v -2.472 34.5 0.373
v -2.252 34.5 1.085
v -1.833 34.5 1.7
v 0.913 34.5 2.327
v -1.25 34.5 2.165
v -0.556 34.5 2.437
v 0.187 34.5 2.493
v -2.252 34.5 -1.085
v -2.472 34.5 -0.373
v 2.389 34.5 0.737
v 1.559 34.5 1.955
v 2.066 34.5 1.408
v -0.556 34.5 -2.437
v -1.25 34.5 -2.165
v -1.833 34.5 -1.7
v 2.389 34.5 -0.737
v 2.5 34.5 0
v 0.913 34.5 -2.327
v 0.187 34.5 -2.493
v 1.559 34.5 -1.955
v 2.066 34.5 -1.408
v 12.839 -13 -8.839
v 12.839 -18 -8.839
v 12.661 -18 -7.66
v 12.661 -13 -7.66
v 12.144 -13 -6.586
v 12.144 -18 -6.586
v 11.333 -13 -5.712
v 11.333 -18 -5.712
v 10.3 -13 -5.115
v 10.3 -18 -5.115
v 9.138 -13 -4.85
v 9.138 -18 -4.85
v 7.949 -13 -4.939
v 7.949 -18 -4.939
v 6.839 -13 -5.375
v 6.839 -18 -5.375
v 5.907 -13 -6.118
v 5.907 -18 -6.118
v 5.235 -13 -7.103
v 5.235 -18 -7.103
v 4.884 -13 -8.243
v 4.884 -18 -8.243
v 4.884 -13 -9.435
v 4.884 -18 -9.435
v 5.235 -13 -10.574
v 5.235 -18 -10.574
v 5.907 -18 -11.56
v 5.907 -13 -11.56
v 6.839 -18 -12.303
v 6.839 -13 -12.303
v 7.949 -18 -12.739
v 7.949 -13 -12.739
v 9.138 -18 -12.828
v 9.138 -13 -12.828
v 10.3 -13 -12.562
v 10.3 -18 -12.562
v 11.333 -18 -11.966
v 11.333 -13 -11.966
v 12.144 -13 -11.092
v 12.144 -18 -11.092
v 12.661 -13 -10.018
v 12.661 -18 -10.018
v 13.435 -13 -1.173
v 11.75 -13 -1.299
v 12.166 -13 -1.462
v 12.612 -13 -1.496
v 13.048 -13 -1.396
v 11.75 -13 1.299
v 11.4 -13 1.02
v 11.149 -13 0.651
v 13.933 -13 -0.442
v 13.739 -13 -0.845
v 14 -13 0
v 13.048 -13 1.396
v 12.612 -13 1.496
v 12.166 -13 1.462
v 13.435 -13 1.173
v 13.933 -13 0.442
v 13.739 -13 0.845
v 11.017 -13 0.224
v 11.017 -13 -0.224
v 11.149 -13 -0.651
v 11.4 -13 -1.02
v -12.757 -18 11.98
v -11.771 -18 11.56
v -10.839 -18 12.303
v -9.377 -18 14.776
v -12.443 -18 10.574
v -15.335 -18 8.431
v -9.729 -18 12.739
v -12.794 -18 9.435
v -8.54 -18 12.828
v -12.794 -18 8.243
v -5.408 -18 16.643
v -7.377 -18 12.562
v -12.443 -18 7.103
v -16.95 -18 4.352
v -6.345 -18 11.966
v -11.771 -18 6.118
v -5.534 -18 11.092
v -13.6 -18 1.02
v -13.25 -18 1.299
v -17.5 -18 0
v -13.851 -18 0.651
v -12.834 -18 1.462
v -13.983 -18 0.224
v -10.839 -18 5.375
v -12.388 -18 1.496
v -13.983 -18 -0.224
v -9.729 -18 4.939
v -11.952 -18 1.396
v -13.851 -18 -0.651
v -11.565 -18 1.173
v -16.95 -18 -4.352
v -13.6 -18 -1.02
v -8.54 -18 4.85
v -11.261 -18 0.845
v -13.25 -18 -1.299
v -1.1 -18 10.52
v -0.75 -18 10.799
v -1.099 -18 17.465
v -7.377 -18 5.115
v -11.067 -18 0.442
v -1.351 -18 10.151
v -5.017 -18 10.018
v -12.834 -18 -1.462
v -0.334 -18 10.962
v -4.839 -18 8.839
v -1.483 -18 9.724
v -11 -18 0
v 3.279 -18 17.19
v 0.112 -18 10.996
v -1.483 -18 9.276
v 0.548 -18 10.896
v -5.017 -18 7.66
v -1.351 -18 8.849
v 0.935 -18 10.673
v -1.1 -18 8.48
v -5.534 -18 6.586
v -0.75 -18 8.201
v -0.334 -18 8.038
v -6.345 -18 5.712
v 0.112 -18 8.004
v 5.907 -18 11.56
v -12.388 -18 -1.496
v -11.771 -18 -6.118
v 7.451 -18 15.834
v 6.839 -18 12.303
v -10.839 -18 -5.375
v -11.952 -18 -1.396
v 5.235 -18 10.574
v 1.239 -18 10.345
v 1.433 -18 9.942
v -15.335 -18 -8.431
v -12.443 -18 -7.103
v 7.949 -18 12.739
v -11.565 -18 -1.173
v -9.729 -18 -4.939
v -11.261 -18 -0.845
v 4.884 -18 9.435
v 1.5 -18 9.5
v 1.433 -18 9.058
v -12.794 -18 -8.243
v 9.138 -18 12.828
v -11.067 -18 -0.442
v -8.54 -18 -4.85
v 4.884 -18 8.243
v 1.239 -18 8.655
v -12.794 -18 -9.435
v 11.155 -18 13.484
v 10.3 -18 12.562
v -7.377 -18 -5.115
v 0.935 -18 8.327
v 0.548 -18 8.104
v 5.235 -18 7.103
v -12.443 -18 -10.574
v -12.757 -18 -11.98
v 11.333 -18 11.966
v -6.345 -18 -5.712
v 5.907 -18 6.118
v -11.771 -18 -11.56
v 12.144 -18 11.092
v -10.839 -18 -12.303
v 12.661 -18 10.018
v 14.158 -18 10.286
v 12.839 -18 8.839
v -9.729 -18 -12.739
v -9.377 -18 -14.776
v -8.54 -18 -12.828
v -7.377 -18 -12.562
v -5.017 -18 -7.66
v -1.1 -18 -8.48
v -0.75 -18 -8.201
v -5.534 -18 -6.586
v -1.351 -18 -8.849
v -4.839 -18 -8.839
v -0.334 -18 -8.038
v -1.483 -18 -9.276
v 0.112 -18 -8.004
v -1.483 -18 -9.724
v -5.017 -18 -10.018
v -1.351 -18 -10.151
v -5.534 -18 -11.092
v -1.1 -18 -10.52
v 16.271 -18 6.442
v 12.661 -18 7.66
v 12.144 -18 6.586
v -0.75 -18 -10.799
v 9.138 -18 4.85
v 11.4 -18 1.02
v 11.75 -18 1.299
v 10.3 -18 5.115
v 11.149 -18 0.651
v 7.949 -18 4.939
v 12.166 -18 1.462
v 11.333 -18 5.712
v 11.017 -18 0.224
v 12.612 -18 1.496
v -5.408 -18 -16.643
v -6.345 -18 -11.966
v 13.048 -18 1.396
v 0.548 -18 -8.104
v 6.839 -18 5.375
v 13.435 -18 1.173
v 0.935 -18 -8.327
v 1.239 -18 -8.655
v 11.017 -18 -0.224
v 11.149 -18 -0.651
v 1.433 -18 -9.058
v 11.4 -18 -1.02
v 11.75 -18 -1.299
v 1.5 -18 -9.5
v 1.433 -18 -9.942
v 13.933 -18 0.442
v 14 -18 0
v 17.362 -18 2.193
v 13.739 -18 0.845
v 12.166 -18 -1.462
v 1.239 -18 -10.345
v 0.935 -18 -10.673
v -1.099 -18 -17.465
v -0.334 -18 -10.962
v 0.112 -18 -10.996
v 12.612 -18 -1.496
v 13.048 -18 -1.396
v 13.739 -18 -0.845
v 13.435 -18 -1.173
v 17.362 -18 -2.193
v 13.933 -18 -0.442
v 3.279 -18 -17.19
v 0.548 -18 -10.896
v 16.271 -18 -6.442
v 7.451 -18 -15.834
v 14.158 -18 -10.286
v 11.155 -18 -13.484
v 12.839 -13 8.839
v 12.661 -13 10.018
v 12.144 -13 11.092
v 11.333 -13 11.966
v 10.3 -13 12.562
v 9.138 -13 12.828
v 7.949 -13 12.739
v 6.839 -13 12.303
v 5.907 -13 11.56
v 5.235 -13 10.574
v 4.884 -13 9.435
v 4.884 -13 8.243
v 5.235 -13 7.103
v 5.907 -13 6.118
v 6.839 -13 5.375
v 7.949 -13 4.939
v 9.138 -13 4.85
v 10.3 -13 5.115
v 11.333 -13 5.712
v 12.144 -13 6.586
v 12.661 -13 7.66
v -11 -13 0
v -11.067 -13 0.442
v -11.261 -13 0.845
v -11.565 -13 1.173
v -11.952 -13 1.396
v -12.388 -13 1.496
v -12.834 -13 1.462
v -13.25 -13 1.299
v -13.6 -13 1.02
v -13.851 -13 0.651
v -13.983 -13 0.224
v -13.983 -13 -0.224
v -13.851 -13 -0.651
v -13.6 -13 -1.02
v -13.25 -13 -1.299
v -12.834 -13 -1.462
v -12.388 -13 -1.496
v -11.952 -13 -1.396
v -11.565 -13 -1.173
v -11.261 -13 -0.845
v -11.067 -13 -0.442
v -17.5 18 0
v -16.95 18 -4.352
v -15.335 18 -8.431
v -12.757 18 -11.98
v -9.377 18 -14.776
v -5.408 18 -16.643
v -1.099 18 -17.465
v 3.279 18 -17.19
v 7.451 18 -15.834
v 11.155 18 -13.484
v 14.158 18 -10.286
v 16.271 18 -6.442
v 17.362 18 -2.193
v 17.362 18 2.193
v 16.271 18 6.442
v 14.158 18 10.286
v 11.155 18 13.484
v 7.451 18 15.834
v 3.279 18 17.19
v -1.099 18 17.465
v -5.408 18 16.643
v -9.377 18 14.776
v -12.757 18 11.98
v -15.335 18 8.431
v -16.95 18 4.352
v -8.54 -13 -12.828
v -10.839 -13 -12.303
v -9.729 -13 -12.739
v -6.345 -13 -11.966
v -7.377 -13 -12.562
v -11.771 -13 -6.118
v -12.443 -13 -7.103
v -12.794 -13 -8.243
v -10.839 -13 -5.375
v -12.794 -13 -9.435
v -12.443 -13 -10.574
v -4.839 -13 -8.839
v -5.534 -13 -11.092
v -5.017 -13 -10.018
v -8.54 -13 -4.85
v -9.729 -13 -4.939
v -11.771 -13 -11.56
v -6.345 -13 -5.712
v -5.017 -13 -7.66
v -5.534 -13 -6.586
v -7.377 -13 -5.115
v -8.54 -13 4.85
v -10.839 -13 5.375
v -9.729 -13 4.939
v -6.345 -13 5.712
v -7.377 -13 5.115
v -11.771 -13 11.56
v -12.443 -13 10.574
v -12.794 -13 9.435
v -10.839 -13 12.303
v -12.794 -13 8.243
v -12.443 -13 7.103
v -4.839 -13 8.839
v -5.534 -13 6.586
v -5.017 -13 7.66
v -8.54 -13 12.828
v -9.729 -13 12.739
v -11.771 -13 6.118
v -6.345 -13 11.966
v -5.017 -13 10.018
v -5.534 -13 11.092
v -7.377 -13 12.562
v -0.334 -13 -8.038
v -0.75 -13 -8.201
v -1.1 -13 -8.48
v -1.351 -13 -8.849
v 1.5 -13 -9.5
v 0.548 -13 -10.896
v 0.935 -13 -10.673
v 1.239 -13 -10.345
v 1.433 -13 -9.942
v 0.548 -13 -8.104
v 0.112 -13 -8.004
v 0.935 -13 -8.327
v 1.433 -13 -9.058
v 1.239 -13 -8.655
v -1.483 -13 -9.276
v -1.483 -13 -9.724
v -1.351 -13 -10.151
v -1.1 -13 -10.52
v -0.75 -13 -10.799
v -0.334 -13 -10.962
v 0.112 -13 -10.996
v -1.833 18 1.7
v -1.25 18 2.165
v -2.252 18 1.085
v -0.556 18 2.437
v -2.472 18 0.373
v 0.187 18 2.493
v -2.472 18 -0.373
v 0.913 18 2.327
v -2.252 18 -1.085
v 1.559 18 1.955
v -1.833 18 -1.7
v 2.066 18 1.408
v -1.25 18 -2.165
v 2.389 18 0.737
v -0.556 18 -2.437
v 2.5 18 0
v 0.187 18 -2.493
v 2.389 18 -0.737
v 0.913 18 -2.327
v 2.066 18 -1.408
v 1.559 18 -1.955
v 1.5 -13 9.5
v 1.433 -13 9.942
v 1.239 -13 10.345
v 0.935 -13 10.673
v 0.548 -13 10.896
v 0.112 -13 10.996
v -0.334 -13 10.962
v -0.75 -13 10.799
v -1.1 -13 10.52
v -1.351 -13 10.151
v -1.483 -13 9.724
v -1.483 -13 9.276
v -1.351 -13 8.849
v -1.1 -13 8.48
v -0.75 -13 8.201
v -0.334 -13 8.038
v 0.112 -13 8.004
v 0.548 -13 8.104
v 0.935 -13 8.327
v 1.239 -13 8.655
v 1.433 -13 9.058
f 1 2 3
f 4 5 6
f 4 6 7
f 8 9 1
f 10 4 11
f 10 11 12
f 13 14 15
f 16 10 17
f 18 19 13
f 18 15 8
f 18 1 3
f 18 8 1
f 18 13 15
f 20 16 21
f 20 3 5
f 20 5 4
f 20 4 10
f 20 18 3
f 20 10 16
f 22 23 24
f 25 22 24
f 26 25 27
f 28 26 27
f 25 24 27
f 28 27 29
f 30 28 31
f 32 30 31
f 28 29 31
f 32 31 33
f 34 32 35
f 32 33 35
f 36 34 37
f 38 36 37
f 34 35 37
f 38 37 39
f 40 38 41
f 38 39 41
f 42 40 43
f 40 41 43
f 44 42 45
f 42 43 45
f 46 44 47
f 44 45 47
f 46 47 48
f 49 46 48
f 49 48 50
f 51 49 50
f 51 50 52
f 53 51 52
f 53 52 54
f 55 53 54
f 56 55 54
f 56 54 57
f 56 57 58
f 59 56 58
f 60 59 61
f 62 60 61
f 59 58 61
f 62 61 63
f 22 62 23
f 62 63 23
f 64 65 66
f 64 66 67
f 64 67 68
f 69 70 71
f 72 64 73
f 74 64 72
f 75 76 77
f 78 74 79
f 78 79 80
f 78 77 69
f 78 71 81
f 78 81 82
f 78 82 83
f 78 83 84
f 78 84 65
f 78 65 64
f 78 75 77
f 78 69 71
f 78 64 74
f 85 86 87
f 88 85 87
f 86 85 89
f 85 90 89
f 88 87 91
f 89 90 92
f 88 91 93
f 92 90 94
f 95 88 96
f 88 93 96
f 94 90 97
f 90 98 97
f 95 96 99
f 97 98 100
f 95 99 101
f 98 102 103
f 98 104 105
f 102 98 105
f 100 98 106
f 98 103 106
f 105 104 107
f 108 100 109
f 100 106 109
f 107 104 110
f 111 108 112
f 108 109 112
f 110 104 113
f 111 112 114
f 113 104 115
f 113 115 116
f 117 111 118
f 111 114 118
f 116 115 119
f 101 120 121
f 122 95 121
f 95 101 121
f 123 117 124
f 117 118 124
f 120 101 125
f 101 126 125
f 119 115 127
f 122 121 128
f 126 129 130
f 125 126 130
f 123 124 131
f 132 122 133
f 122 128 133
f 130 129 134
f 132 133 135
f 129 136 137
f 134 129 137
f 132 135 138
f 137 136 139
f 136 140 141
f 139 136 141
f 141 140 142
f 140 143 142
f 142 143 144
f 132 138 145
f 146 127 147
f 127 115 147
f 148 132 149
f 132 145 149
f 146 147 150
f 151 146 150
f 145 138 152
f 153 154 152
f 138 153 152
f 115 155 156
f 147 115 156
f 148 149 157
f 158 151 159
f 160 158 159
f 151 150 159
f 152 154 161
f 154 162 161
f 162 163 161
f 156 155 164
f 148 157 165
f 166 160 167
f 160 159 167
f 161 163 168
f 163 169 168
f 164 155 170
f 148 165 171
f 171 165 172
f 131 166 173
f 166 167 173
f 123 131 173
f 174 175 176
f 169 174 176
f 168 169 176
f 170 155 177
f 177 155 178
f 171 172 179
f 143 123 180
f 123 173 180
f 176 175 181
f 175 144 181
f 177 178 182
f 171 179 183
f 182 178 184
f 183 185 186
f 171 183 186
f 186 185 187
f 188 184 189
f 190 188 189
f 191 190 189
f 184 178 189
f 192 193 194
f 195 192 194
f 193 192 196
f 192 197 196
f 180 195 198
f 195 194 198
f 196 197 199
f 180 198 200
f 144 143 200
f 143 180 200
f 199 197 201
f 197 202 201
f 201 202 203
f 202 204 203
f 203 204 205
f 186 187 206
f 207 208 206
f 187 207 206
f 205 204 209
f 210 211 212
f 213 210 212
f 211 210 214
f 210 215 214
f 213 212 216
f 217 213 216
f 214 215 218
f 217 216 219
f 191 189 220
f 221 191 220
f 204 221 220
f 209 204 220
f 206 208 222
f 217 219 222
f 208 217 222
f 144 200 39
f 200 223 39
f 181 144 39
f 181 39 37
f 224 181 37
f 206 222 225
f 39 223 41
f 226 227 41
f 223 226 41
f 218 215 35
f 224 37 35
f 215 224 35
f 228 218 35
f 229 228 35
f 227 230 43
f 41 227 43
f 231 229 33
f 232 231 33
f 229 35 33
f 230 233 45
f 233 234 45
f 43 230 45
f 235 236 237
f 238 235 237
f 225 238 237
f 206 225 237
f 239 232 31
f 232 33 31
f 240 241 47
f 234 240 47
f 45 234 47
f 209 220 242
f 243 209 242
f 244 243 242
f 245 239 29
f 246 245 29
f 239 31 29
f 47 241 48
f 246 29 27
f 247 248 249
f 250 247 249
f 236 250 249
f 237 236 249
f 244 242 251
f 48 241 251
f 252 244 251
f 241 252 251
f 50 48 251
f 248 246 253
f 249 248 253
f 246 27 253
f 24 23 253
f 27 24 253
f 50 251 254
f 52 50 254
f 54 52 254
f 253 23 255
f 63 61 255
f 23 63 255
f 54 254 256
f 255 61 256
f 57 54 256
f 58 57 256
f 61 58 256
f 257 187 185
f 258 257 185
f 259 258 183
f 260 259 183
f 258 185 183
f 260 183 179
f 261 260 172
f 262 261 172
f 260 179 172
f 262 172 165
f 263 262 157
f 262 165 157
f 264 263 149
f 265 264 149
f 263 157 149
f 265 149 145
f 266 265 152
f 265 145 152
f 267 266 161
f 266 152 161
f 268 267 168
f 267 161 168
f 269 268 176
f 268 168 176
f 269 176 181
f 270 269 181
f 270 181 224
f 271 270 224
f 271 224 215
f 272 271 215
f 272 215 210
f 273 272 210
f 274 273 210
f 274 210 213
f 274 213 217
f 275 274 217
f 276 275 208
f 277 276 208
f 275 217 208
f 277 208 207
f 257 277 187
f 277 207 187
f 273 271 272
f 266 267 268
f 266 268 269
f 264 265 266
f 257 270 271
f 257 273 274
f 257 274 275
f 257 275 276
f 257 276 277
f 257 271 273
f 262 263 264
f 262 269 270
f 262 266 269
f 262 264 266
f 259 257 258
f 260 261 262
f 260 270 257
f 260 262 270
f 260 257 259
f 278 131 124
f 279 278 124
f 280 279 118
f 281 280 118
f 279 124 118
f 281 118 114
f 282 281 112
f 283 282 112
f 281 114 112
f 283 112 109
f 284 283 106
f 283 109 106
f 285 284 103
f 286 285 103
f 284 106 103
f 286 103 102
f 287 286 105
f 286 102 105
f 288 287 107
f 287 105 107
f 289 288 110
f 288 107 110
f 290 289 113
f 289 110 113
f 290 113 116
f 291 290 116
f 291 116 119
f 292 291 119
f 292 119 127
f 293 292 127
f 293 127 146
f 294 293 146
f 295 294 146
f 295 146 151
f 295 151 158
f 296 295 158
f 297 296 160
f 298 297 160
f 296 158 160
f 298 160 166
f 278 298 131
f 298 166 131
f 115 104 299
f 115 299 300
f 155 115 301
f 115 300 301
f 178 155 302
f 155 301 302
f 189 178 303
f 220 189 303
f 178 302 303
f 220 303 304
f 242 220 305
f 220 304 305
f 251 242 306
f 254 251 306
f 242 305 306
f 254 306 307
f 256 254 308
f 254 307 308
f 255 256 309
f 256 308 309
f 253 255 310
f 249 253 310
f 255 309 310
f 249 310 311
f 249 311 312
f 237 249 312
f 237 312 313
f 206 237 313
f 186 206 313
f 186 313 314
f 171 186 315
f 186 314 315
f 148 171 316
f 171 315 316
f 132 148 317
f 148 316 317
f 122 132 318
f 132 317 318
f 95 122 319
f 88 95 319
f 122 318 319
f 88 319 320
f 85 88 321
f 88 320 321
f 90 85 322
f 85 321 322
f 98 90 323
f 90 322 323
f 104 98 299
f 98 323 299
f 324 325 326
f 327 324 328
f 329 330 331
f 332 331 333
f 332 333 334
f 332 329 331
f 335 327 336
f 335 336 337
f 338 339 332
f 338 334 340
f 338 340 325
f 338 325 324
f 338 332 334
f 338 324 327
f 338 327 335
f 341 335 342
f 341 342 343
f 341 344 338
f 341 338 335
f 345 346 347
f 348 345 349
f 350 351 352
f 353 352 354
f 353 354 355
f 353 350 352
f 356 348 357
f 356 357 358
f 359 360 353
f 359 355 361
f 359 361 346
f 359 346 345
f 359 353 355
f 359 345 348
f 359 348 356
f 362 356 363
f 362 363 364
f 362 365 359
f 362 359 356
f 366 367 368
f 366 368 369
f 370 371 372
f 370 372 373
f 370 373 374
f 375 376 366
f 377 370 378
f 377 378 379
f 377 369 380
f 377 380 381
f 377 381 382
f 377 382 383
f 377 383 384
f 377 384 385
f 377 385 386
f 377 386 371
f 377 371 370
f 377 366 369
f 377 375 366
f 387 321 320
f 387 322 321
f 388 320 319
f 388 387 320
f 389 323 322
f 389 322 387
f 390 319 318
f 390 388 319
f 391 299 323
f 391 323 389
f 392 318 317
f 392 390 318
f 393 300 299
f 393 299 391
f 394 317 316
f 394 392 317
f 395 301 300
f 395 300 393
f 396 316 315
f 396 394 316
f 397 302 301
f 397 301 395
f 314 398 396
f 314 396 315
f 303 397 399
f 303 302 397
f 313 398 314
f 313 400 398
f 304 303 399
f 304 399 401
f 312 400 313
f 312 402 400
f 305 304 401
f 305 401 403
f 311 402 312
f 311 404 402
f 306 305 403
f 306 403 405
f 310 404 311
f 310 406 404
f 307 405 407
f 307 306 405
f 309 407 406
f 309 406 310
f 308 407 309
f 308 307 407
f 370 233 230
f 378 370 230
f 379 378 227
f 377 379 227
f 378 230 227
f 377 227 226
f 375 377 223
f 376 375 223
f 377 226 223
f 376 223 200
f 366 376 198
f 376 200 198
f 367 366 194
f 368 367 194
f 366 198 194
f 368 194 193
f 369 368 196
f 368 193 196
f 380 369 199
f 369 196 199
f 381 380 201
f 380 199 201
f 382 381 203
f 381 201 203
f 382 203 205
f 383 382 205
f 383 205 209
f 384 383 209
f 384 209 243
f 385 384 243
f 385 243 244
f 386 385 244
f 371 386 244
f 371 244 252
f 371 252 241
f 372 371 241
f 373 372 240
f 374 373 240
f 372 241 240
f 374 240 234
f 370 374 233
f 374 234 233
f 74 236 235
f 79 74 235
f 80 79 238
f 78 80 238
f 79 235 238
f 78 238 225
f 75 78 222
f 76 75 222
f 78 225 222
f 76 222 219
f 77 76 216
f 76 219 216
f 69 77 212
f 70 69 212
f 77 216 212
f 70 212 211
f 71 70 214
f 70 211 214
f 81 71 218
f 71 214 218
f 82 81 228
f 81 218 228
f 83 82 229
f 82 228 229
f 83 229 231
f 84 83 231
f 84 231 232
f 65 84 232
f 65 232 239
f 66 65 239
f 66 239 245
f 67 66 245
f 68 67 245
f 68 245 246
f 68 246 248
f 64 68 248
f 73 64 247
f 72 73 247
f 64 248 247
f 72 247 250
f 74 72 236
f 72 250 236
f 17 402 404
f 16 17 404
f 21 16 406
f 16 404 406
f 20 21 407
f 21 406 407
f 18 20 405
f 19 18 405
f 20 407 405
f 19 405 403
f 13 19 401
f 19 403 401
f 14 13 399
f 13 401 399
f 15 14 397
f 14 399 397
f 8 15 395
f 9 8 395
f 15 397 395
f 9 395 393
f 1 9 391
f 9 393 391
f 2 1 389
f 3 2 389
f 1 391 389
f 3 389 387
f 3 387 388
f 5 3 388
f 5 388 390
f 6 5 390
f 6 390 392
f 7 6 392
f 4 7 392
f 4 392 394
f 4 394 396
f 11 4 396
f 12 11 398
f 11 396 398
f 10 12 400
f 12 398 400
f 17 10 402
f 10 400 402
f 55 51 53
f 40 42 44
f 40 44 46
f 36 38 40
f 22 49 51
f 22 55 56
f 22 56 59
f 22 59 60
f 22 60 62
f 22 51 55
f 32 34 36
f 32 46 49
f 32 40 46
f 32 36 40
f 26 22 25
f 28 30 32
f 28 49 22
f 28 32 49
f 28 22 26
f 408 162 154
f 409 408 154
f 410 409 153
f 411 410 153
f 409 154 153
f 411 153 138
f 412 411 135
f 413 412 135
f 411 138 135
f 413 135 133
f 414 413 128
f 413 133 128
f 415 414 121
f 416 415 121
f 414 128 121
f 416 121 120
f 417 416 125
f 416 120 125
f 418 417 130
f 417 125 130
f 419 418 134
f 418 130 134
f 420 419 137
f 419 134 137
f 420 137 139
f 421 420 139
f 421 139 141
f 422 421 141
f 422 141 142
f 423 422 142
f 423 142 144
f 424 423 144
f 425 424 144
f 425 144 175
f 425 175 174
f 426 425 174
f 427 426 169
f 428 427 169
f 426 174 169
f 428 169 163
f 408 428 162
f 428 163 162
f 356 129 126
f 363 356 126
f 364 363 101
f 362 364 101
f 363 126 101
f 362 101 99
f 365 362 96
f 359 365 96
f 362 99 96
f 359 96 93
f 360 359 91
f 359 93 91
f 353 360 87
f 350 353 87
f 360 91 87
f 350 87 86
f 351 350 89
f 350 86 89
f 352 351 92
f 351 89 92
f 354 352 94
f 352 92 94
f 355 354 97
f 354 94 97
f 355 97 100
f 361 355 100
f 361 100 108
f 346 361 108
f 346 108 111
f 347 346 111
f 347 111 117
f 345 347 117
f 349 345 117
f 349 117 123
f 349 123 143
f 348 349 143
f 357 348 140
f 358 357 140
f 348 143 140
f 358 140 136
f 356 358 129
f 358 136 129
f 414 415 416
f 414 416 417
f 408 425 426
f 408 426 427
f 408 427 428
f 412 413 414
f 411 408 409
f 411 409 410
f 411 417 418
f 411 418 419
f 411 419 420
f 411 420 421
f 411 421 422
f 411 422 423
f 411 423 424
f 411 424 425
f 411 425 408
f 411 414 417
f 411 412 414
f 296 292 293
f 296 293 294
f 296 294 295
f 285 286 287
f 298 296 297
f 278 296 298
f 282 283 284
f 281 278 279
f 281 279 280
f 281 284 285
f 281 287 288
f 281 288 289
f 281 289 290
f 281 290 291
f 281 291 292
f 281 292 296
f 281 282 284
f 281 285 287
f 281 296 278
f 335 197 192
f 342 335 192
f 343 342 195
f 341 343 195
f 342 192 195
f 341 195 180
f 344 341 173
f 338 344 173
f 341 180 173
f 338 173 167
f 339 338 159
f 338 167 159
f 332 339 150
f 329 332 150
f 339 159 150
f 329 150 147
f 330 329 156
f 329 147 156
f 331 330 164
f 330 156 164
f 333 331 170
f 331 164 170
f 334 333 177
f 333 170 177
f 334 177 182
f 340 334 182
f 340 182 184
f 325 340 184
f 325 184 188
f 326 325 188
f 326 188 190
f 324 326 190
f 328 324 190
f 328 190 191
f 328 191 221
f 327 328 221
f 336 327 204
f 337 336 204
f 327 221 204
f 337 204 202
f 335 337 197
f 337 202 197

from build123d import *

# Parameters (mm, degrees)
SKETCH2_W           = 17.5
SKETCH2_H           = 36
SKETCH3_R           = 2.5
BOSS_EXTRUDE1_DEPTH = 16.5
SKETCH4_R           = 1.5
SKETCH4_R_2         = 4
CUT_EXTRUDE2_DEPTH  = 5


with BuildPart() as part:
    # Sketch2 → Revolve1 (revolve)
    with BuildSketch(Plane.XY, mode=Mode.PRIVATE) as revolve1_sk:
        with Locations((8.75, 0)):
            Rectangle(SKETCH2_W, SKETCH2_H)
    revolve(revolve1_sk.sketch.rotate(Axis((0, 18, 0), (0, -1, 0)), 180), axis=Axis((0, 18, 0), (0, -1, 0)))

    # Sketch3 → Boss-Extrude1 (add)
    with BuildSketch(Plane(origin=(0, 18, 0), x_dir=(1, 0, 0), z_dir=(0, 1, 0))):
        Circle(SKETCH3_R)
    extrude(amount=BOSS_EXTRUDE1_DEPTH)

    # Sketch4 → Cut-Extrude2 (cut)
    with BuildSketch(Plane.XZ.offset(18)):
        with Locations((0, 9.5)):
            Circle(SKETCH4_R)
        with Locations((0, -9.5)):
            Circle(SKETCH4_R)
        with Locations((12.5, 0)):
            Circle(SKETCH4_R)
        with Locations((-12.5, 0)):
            Circle(SKETCH4_R)
        with Locations((-8.838834765, 8.838834765)):
            Circle(SKETCH4_R_2)
        with Locations((8.838834765, -8.838834765)):
            Circle(SKETCH4_R_2)
        with Locations((-8.838834765, -8.838834765)):
            Circle(SKETCH4_R_2)
        with Locations((8.838834765, 8.838834765)):
            Circle(SKETCH4_R_2)
    extrude(amount=-CUT_EXTRUDE2_DEPTH, mode=Mode.SUBTRACT)


solid = part.part
